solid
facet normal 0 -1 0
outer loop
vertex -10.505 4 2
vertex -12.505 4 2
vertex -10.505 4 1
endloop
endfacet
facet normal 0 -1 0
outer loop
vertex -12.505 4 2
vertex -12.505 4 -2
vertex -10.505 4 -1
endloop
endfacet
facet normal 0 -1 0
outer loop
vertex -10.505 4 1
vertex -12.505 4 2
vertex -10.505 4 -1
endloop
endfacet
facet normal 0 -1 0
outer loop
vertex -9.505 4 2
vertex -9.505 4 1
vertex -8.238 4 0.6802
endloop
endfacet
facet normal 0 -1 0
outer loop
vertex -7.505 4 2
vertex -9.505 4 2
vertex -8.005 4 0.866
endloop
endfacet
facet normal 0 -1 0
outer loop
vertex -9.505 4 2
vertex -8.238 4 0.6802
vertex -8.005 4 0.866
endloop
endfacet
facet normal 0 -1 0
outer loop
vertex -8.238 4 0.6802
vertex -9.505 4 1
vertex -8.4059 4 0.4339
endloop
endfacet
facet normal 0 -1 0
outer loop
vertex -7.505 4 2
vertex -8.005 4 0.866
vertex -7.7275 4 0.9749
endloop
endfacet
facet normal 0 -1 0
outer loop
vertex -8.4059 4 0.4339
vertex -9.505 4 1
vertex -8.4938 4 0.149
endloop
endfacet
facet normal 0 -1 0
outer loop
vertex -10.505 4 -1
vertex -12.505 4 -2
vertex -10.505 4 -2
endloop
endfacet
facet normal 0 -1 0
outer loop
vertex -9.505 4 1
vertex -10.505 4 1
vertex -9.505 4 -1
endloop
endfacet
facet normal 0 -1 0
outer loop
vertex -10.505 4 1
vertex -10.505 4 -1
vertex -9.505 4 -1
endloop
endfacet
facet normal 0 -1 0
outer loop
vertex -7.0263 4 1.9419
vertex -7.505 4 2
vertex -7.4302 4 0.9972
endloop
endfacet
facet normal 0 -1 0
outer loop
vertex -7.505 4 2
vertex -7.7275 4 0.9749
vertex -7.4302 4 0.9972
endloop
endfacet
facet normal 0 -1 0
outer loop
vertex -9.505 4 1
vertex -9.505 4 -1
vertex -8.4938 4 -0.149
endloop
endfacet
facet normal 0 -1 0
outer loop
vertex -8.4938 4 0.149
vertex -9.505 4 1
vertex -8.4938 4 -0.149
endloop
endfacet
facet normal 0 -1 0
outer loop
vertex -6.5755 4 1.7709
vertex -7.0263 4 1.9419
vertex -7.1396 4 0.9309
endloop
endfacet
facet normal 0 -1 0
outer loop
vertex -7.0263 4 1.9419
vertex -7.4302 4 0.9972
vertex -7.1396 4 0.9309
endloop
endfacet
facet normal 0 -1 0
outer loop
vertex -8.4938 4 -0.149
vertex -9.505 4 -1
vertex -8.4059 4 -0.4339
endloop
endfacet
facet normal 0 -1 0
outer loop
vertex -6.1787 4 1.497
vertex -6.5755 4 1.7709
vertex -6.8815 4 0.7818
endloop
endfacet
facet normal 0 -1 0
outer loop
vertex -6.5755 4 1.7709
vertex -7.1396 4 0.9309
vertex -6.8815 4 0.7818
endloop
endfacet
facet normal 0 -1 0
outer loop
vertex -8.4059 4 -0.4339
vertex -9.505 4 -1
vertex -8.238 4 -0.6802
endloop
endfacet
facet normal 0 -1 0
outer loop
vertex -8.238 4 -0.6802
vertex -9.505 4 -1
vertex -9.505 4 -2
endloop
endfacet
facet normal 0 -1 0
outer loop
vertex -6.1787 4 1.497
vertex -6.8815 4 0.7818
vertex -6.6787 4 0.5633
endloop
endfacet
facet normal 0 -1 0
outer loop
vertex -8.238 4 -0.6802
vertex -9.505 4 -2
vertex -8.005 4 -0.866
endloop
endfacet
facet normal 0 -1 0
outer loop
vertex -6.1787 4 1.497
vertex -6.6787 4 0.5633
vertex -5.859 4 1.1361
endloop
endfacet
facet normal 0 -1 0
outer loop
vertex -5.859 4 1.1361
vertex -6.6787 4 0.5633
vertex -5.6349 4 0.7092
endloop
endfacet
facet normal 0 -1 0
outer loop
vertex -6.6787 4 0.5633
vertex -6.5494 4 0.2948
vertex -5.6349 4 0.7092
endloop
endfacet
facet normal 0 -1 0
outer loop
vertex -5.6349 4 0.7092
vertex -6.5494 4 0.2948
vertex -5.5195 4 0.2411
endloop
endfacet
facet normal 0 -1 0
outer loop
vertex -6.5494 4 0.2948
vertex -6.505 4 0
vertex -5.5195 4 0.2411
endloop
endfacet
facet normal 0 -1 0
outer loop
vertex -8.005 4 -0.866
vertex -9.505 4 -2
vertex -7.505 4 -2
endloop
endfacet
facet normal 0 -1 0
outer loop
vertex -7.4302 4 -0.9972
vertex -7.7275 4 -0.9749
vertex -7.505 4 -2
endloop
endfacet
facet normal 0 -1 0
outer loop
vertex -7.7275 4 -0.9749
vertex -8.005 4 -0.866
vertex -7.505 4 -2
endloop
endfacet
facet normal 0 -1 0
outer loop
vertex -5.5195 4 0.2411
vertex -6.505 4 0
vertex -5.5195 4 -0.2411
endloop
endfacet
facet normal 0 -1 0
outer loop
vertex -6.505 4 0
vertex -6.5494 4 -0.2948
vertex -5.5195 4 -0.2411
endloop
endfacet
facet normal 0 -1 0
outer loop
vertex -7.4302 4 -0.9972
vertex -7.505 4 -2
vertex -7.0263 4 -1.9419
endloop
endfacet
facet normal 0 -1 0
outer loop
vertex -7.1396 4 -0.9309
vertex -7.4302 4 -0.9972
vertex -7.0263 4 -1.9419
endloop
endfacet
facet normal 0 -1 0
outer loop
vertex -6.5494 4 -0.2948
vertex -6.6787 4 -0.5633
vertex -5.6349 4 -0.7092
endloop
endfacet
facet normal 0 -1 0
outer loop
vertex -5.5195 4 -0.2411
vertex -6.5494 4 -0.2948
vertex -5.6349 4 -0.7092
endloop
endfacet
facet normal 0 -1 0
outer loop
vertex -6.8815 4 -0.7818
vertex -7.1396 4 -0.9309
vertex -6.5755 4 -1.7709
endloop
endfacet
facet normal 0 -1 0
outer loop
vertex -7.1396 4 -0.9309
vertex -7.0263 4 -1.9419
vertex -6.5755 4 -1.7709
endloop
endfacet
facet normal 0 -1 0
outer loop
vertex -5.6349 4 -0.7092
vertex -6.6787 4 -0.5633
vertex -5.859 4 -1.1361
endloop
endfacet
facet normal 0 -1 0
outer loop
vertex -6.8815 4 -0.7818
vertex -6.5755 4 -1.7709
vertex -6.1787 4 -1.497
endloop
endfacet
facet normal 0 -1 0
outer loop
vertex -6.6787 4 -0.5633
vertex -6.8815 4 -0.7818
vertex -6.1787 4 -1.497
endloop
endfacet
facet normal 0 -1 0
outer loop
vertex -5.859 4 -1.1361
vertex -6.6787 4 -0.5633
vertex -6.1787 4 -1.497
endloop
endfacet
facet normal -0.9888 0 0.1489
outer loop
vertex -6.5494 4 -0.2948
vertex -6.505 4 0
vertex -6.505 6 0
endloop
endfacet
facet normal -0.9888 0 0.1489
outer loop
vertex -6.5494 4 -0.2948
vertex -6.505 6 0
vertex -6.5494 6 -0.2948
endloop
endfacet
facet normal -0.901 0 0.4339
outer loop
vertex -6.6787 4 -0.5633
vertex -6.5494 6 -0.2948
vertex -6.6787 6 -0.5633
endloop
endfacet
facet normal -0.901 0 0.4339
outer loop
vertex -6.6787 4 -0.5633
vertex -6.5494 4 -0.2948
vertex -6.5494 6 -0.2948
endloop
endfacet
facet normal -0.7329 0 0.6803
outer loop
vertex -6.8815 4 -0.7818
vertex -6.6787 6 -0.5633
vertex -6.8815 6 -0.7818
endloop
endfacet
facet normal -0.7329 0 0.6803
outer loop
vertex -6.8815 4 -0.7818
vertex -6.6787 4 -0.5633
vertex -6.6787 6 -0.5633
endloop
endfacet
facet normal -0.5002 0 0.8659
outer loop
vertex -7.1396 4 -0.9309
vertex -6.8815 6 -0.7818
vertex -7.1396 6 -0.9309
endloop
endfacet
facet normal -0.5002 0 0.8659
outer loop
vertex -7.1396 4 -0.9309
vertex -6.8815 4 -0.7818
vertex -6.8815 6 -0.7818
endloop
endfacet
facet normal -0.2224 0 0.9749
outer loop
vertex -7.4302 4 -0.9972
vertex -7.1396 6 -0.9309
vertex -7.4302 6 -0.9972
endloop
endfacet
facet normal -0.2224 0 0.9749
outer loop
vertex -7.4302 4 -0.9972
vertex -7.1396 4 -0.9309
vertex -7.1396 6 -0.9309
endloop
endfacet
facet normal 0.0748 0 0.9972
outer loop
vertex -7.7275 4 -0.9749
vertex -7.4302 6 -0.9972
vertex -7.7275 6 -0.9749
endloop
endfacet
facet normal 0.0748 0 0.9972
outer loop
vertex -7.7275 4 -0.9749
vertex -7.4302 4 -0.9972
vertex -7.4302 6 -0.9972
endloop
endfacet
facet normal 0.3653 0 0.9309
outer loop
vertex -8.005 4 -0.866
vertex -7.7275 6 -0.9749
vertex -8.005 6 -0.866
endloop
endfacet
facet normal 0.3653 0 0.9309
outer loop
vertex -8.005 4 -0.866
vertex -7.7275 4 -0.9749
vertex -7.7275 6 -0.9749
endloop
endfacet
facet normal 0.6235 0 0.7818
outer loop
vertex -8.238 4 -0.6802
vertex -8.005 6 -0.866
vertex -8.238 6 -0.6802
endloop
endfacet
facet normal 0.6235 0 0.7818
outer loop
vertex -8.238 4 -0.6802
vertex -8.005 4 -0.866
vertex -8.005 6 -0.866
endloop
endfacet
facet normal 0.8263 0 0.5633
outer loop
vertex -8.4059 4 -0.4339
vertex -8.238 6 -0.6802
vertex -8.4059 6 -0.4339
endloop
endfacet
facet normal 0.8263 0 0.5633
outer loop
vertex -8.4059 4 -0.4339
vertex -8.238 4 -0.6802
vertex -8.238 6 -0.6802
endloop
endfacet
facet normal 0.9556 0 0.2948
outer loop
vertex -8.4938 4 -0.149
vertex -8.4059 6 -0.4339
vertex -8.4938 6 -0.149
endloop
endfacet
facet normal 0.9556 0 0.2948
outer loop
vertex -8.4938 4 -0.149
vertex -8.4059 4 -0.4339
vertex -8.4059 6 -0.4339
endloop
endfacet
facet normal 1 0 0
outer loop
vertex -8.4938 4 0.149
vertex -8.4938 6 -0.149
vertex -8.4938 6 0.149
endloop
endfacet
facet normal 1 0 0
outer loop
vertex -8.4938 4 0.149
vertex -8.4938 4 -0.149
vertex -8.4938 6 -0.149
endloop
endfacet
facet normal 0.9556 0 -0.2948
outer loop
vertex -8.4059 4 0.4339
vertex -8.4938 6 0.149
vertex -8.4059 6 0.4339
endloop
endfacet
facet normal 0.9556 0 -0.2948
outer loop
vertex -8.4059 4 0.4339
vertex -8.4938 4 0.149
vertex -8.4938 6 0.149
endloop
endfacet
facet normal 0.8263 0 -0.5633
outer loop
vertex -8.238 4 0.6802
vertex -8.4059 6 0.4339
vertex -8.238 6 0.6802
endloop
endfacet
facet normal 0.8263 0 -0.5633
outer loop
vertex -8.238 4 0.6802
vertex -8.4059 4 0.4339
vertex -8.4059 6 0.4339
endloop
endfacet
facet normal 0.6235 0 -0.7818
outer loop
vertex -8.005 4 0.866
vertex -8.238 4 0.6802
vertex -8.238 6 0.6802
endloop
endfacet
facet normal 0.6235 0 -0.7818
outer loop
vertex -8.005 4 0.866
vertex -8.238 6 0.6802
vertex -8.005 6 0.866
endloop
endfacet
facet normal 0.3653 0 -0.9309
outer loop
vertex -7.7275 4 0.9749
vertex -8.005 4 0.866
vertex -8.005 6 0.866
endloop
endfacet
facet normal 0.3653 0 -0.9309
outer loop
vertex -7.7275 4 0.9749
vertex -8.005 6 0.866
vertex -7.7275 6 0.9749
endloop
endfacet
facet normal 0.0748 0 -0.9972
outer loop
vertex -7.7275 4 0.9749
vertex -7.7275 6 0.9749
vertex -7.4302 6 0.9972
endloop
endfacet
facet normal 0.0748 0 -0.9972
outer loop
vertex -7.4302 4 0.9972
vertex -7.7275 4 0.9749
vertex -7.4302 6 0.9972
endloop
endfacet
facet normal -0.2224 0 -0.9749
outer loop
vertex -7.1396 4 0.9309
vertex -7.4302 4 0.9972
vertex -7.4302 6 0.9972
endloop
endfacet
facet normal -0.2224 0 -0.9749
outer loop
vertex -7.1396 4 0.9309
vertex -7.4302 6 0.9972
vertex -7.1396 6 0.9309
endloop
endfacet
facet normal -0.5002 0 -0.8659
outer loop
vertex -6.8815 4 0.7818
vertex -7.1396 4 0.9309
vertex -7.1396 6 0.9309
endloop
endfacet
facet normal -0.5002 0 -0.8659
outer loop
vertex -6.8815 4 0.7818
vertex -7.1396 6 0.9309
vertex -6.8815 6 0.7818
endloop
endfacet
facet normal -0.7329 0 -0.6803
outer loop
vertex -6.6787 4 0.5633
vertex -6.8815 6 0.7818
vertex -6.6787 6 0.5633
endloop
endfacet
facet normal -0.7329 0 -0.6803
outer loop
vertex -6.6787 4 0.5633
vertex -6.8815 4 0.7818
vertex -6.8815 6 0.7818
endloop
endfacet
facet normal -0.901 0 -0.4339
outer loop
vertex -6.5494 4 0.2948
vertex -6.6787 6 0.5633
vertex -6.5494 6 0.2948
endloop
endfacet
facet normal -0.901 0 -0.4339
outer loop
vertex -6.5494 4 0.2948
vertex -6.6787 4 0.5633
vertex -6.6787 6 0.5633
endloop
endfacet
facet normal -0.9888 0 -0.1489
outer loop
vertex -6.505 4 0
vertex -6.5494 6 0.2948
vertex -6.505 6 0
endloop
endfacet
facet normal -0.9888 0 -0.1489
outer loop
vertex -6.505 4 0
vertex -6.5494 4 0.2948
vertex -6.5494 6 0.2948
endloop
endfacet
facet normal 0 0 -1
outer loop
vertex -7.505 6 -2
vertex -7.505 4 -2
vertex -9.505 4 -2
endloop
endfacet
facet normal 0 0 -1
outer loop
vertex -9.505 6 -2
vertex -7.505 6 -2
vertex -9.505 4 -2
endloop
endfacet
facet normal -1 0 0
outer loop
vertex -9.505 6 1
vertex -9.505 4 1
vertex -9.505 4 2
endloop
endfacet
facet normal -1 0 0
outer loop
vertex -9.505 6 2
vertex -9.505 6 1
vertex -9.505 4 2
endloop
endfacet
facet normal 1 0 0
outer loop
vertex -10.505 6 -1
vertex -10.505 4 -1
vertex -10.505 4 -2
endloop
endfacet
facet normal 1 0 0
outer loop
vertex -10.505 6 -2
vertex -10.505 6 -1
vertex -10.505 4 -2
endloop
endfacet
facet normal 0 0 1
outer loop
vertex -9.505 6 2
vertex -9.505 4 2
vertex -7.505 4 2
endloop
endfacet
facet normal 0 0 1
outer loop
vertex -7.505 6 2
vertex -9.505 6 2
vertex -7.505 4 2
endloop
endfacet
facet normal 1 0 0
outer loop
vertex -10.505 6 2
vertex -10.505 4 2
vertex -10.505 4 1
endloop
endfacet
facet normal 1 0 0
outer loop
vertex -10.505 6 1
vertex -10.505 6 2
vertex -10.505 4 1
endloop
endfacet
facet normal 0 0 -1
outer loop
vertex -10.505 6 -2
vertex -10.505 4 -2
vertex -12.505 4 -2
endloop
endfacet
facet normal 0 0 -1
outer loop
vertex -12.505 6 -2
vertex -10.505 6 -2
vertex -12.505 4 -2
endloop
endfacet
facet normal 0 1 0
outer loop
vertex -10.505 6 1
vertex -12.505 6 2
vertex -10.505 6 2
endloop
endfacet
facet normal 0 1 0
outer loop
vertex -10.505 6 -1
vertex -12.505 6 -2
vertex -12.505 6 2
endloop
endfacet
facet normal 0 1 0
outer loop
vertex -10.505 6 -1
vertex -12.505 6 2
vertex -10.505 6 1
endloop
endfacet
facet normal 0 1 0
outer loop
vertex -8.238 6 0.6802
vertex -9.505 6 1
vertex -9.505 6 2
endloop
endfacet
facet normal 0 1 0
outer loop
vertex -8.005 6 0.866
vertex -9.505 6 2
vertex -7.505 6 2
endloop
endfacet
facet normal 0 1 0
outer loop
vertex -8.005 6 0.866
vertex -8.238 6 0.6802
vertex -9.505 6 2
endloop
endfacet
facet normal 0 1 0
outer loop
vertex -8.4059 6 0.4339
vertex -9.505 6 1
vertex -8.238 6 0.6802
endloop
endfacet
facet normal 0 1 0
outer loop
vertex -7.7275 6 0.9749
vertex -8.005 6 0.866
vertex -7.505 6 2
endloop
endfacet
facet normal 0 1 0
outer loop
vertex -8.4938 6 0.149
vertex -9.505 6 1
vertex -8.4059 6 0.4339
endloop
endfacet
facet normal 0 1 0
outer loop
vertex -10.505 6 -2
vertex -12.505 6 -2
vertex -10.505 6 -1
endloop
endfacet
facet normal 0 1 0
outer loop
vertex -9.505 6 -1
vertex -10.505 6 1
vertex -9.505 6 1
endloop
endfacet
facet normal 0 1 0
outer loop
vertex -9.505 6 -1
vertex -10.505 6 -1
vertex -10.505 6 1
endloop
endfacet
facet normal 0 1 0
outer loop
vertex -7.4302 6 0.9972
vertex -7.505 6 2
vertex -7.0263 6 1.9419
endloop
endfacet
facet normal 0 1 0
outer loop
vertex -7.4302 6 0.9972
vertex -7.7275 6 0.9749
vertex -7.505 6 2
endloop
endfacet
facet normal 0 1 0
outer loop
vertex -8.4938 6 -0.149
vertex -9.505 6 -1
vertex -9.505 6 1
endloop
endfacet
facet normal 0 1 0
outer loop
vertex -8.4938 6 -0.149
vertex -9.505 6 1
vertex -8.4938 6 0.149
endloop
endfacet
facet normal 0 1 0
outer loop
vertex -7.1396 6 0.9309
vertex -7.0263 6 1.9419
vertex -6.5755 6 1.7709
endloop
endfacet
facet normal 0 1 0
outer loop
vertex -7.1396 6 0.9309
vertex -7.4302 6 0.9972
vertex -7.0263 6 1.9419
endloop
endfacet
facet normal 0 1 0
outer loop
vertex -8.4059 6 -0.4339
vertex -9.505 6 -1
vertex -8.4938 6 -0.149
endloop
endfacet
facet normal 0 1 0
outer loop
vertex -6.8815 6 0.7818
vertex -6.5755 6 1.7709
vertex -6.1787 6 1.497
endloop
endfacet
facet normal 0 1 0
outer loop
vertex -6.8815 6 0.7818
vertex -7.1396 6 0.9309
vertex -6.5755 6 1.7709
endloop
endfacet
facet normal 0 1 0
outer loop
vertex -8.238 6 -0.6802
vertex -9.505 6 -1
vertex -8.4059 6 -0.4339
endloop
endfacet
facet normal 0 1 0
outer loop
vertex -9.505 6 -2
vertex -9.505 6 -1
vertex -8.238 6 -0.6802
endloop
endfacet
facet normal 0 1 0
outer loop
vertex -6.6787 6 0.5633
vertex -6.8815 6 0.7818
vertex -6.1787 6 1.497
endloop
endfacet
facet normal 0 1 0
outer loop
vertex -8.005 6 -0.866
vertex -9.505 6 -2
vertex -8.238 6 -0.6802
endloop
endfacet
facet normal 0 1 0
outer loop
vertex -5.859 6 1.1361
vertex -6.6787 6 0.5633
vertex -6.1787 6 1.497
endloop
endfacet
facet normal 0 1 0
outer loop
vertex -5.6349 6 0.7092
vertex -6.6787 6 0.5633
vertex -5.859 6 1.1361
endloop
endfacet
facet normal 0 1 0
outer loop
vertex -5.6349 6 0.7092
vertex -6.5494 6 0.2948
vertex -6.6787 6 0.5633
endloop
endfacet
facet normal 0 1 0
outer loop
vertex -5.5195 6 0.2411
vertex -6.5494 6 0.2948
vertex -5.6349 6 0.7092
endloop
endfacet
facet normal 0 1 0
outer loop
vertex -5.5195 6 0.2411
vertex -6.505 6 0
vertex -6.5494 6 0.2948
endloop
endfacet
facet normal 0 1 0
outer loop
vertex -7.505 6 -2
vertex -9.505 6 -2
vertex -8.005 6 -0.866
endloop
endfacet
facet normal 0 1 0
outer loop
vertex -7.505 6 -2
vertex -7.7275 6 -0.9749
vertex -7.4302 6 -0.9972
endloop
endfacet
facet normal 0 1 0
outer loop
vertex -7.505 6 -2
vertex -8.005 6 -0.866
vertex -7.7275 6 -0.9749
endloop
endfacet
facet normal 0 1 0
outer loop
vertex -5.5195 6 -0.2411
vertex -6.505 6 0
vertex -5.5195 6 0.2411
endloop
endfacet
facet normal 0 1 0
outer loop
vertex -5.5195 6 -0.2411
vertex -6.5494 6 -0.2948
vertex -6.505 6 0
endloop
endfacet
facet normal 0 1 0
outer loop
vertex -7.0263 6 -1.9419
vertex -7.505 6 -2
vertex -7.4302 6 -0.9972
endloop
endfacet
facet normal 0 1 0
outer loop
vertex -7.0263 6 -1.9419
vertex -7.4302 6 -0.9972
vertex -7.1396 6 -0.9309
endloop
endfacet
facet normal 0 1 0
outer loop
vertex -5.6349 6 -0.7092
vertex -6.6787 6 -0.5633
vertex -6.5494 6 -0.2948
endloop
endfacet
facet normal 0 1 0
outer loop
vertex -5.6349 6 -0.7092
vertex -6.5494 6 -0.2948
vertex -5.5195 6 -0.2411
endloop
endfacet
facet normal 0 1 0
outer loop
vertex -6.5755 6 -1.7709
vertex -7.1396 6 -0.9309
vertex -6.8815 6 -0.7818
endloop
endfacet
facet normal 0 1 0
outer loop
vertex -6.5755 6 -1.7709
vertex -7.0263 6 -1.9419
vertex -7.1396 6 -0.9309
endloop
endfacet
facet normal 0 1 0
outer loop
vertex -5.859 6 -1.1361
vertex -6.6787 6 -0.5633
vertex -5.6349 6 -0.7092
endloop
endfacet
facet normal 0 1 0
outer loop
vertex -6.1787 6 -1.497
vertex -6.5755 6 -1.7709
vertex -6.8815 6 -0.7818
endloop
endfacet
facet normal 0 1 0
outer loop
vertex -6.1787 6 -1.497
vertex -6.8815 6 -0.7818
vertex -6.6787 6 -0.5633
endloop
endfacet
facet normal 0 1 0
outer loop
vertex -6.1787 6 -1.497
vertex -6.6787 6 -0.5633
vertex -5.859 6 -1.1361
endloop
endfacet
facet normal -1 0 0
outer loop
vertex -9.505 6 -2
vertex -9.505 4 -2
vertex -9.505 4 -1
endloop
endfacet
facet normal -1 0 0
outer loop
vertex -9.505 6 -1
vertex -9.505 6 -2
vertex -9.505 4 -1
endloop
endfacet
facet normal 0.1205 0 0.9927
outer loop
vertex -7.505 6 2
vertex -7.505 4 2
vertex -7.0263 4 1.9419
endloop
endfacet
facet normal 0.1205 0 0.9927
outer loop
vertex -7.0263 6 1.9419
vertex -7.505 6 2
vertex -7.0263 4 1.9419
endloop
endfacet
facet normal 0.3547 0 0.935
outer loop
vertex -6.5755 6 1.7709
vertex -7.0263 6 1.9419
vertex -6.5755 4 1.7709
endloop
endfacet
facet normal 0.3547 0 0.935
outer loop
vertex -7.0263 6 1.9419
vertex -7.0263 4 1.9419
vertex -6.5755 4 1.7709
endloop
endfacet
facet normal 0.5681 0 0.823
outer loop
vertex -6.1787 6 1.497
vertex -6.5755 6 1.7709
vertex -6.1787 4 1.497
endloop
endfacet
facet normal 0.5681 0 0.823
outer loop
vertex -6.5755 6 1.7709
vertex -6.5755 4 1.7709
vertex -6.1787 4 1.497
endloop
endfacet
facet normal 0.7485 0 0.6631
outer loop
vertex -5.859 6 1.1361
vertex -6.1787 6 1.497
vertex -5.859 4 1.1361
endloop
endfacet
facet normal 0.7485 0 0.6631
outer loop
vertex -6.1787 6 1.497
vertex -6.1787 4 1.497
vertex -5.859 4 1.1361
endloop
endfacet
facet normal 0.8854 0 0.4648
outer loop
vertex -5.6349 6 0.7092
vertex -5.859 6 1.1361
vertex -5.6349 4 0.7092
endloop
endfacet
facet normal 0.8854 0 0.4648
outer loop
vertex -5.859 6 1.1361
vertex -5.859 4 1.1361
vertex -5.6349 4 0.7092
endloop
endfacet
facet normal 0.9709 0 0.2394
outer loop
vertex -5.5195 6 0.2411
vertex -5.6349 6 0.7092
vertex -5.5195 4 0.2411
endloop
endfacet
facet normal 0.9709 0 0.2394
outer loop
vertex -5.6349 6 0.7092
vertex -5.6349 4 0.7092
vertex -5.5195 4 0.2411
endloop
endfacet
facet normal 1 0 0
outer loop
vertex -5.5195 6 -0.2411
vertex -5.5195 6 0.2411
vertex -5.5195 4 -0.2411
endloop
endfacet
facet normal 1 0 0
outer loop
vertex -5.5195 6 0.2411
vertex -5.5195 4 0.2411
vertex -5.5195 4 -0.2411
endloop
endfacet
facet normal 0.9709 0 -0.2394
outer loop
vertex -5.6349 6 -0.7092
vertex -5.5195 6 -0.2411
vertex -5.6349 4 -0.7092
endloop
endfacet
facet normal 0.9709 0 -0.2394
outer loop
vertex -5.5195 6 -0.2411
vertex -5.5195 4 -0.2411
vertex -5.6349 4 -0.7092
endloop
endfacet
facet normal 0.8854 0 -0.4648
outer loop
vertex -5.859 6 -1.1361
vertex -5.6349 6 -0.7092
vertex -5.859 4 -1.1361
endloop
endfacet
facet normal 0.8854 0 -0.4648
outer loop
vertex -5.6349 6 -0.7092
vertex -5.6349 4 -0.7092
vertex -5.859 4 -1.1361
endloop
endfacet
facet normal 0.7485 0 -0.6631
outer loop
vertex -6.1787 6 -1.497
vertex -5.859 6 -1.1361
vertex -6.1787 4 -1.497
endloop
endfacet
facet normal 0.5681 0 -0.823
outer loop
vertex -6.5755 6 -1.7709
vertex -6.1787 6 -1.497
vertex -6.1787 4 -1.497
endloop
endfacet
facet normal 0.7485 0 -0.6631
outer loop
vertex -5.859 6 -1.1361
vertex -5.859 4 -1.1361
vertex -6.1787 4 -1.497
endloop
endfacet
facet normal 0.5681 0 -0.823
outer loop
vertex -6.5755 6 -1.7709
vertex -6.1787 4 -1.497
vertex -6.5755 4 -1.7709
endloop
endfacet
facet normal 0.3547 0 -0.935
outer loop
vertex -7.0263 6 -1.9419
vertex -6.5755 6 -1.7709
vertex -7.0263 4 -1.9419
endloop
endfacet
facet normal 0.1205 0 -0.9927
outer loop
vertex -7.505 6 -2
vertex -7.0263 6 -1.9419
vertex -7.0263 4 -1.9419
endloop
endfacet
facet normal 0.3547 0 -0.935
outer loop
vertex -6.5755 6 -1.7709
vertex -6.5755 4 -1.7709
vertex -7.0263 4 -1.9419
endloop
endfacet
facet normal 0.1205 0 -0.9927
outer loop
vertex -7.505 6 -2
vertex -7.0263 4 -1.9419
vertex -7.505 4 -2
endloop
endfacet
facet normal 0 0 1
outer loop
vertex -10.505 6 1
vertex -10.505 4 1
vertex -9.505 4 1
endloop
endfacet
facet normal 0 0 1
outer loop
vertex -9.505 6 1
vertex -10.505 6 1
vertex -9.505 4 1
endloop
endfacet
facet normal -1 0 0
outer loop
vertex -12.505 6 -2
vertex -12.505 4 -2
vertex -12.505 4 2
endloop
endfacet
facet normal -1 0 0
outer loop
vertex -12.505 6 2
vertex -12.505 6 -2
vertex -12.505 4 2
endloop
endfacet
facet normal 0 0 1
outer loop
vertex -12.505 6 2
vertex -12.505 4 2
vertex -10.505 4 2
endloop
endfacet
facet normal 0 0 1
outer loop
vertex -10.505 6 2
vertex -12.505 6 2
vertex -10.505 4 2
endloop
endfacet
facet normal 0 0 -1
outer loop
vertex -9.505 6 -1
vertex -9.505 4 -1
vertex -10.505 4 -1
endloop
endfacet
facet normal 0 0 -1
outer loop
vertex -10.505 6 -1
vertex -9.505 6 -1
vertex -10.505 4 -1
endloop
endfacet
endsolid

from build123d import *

# Parameters (mm, degrees)
SKETCH_1_R      = 5
EXTRUDE_1_DEPTH = 10
SCALE_1_SCALE   = 0.2


with BuildPart() as part:
    # 草圖1 → 填料-伸長1 (new body)
    with BuildSketch(Plane(origin=(0, 0, 0), x_dir=(1, 0, 0), z_dir=(0, 1, 0))):
        with BuildLine():
            ThreePointArc((0, -10), (10, 0), (0, 10))
            Line((0, 10), (-10, 10))
            Line((-10, 10), (-10, 5))
            Line((-10, 5), (-15, 5))
            Line((-15, 5), (-15, 10))
            Line((-15, 10), (-25, 10))
            Line((-25, 10), (-25, -10))
            Line((-25, -10), (-15, -10))
            Line((-15, -10), (-15, -5))
            Line((-15, -5), (-10, -5))
            Line((-10, -5), (-10, -10))
            Line((-10, -10), (0, -10))
        make_face()
        Circle(SKETCH_1_R, mode=Mode.SUBTRACT)
    extrude(amount=EXTRUDE_1_DEPTH)


with BuildPart() as part_1:
    # 縮放比例1: scaled about (-9.381191691, 5, 0)
    add(part.part.scale(SCALE_1_SCALE).moved(Location((-7.504953353, 4, 0))))


solid = part_1.part
